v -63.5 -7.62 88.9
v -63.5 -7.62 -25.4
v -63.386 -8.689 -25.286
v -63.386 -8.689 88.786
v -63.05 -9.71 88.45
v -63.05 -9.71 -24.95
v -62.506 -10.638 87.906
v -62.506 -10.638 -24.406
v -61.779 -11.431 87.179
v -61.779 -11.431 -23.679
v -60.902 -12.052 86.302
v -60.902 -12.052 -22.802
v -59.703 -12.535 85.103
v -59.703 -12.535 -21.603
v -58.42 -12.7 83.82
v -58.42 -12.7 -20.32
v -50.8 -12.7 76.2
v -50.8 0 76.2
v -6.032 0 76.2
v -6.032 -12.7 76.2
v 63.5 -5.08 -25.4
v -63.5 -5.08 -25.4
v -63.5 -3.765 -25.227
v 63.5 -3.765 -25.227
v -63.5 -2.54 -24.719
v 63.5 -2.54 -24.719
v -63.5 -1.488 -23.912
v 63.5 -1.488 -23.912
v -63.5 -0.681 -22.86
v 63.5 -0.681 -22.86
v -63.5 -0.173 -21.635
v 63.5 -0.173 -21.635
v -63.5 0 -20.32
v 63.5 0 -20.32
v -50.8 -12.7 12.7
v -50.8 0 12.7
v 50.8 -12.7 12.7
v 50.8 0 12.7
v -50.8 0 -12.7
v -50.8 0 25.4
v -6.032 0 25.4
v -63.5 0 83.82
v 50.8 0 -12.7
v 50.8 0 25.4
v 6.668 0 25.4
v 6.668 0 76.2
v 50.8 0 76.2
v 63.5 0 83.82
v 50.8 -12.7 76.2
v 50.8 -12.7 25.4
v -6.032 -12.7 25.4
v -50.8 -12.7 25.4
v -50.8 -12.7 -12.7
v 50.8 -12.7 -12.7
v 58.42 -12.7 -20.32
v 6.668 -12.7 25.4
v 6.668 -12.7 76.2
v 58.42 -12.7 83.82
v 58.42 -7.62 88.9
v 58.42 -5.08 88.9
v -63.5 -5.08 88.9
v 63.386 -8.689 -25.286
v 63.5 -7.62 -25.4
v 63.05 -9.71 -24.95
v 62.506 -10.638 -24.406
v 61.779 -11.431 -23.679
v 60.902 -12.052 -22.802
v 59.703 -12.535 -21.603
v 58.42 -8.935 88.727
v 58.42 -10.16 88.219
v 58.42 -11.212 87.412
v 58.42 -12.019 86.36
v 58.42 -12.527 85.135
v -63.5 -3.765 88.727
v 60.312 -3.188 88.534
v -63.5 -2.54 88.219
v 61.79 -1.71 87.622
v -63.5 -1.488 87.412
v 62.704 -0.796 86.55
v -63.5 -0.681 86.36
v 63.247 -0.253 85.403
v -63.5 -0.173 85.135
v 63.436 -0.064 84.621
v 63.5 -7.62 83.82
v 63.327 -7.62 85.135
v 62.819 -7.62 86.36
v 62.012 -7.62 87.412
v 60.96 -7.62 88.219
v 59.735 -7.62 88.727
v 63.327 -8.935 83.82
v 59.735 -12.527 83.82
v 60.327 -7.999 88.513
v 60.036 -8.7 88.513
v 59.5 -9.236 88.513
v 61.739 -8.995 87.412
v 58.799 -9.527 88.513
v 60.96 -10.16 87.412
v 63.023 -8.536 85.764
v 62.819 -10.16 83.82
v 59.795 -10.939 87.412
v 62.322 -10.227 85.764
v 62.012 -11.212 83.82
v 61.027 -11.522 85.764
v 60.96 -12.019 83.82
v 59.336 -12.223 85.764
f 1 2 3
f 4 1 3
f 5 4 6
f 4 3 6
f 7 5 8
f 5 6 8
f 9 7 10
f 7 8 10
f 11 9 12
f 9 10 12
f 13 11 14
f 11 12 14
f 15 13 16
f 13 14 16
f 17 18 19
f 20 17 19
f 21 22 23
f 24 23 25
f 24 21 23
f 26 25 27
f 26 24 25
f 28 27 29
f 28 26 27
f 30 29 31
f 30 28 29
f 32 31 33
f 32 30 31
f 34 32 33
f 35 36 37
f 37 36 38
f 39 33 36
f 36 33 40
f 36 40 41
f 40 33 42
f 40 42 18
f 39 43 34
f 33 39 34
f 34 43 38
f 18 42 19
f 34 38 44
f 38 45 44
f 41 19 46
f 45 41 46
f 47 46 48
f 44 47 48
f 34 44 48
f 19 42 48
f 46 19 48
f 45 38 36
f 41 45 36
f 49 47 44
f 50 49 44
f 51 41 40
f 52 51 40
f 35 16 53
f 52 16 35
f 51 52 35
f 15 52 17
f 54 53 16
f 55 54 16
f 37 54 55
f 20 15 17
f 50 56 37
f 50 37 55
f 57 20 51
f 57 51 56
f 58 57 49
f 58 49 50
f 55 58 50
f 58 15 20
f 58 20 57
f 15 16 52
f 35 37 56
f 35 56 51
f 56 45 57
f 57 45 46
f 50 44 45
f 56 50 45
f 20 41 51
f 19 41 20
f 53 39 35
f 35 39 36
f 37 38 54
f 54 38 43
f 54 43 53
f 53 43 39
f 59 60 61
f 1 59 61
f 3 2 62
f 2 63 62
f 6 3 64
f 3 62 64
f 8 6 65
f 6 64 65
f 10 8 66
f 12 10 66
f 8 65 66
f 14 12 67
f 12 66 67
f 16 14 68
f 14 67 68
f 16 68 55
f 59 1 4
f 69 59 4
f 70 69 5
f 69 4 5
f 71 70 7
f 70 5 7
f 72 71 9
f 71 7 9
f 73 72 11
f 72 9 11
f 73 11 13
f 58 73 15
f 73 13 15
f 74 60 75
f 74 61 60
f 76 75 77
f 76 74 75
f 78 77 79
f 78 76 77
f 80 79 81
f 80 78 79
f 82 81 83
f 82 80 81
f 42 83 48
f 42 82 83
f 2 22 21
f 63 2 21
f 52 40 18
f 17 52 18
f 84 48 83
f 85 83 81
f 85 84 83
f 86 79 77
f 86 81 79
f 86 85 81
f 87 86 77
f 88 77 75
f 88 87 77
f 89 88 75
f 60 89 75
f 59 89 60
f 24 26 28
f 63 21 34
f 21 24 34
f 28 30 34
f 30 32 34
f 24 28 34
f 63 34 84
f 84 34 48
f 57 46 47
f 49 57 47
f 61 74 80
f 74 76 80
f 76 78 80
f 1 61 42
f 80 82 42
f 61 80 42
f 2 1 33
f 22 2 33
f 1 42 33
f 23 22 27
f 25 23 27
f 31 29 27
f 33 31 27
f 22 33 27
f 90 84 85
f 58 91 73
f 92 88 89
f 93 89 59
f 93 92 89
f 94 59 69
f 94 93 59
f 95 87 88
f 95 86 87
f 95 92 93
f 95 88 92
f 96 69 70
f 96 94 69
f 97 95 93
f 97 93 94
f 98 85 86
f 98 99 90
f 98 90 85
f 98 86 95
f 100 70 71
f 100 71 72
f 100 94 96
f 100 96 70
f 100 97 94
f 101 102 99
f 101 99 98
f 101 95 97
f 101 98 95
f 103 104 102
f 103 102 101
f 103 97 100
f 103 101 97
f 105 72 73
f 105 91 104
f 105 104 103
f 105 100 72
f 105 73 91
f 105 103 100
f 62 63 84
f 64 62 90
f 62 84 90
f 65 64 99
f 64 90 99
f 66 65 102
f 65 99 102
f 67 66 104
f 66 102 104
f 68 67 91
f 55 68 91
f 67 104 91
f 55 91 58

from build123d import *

# Parameters (mm, degrees)
F0_W     = 12.7
F0_H     = 50.8
F1_DEPTH = 12.7
F2_R     = 5.08


with BuildPart() as f1:
    # F0 (on Front) → F1 (new body)
    with BuildSketch(Plane.XZ):
        Polygon((-63.5, 25.4), (-63.5, -25.4), (63.5, -25.4), (63.5, 25.4), (63.5, 88.9), (-63.5, 88.9), align=None)
        Polygon((-50.8, 12.7), (-50.8, 25.4), (-50.8, 76.2), (-6.031548, 76.2), (6.668452, 76.2), (50.8, 76.2), (50.8, 25.4), (50.8, 12.7), (50.8, -12.7), (-50.8, -12.7), align=None, mode=Mode.SUBTRACT)
        Polygon((-6.031548, 25.4), (-50.8, 25.4), (-50.8, 12.7), (50.8, 12.7), (50.8, 25.4), (6.668452, 25.4), align=None)
        with Locations((0.318452, 50.8)):
            Rectangle(F0_W, F0_H)
    extrude(amount=F1_DEPTH)

    # F2
    f2_edges = [f1.edges().sort_by_distance(p)[0] for p in [
        (0, 0, 88.9),
        (0, 0, -25.4),
        (63.5, -12.7, 31.75),
        (63.5, -6.35, 88.9),
        (0, -12.7, 88.9),
        (-63.5, -12.7, 31.75),
        (0, -12.7, -25.4),
    ]]
    fillet(f2_edges, radius=F2_R)


solid = f1.part
